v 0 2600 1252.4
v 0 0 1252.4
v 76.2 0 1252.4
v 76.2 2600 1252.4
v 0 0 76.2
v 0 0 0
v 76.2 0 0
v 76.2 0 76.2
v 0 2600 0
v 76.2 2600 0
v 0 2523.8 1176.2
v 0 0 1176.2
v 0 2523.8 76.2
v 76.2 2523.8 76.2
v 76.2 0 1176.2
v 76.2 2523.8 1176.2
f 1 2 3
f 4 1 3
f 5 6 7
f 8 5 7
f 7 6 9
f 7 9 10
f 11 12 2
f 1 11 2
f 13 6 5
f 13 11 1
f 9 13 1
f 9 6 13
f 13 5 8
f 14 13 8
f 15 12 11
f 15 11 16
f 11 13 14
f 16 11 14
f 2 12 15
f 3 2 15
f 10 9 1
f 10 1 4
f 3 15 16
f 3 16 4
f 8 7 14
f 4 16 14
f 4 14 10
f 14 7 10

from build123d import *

# Parameters (mm, degrees)
CROQUIS1_W                 = 76.2
CROQUIS1_H                 = 76.2
SALIENTE_EXTRUIR1_DEPTH    = 2600
SALIENTE_EXTRUIR1_2_DEPTH  = 2600
SALIENTE_EXTRUIR1_3_DEPTH  = 2600
SALIENTE_EXTRUIR1_4_DEPTH  = 2600
SALIENTE_EXTRUIR1_5_DEPTH  = 2600
SALIENTE_EXTRUIR1_6_DEPTH  = 2600
SALIENTE_EXTRUIR1_7_DEPTH  = 2600
SALIENTE_EXTRUIR1_8_DEPTH  = 2600
SALIENTE_EXTRUIR1_9_DEPTH  = 2600
SALIENTE_EXTRUIR1_10_DEPTH = 2600
CROQUIS2_W                 = 76.2
CROQUIS2_H                 = 76.2
SALIENTE_EXTRUIR2_DEPTH    = 1100
CROQUIS3_W                 = 1252.4
CROQUIS3_H                 = 2600
CORTAR_EXTRUIR1_DEPTH      = 5924.8


with BuildPart() as part:
    # Croquis1 → Saliente-Extruir1 (new body)
    with BuildSketch(Plane(origin=(0, 0, 0), x_dir=(1, 0, 0), z_dir=(0, 1, 0))):
        with Locations((38.1, -38.1)):
            Rectangle(CROQUIS1_W, CROQUIS1_H)
    extrude(amount=SALIENTE_EXTRUIR1_DEPTH)



with BuildPart() as body_2:
    # Croquis1 → Saliente-Extruir1 2 (new body)
    with BuildSketch(Plane(origin=(0, 0, 0), x_dir=(1, 0, 0), z_dir=(0, 1, 0))):
        with Locations((1519.3, -38.1)):
            Rectangle(CROQUIS1_W, CROQUIS1_H)
    extrude(amount=SALIENTE_EXTRUIR1_2_DEPTH)


with BuildPart() as body_3:
    # Croquis1 → Saliente-Extruir1 3 (new body)
    with BuildSketch(Plane(origin=(0, 0, 0), x_dir=(1, 0, 0), z_dir=(0, 1, 0))):
        with Locations((3000.5, -38.1)):
            Rectangle(CROQUIS1_W, CROQUIS1_H)
    extrude(amount=SALIENTE_EXTRUIR1_3_DEPTH)


with BuildPart() as body_4:
    # Croquis1 → Saliente-Extruir1 4 (new body)
    with BuildSketch(Plane(origin=(0, 0, 0), x_dir=(1, 0, 0), z_dir=(0, 1, 0))):
        with Locations((4481.7, -38.1)):
            Rectangle(CROQUIS1_W, CROQUIS1_H)
    extrude(amount=SALIENTE_EXTRUIR1_4_DEPTH)


with BuildPart() as body_5:
    # Croquis1 → Saliente-Extruir1 5 (new body)
    with BuildSketch(Plane(origin=(0, 0, 0), x_dir=(1, 0, 0), z_dir=(0, 1, 0))):
        with Locations((5962.9, -38.1)):
            Rectangle(CROQUIS1_W, CROQUIS1_H)
    extrude(amount=SALIENTE_EXTRUIR1_5_DEPTH)


with BuildPart() as body_6:
    # Croquis1 → Saliente-Extruir1 6 (new body)
    with BuildSketch(Plane(origin=(0, 0, 0), x_dir=(1, 0, 0), z_dir=(0, 1, 0))):
        with Locations((5962.9, -1214.3)):
            Rectangle(CROQUIS1_W, CROQUIS1_H)
    extrude(amount=SALIENTE_EXTRUIR1_6_DEPTH)


with BuildPart() as body_7:
    # Croquis1 → Saliente-Extruir1 7 (new body)
    with BuildSketch(Plane(origin=(0, 0, 0), x_dir=(1, 0, 0), z_dir=(0, 1, 0))):
        with Locations((4481.7, -1214.3)):
            Rectangle(CROQUIS1_W, CROQUIS1_H)
    extrude(amount=SALIENTE_EXTRUIR1_7_DEPTH)


with BuildPart() as body_8:
    # Croquis1 → Saliente-Extruir1 8 (new body)
    with BuildSketch(Plane(origin=(0, 0, 0), x_dir=(1, 0, 0), z_dir=(0, 1, 0))):
        with Locations((3000.5, -1214.3)):
            Rectangle(CROQUIS1_W, CROQUIS1_H)
    extrude(amount=SALIENTE_EXTRUIR1_8_DEPTH)


with BuildPart() as body_9:
    # Croquis1 → Saliente-Extruir1 9 (new body)
    with BuildSketch(Plane(origin=(0, 0, 0), x_dir=(1, 0, 0), z_dir=(0, 1, 0))):
        with Locations((1519.3, -1214.3)):
            Rectangle(CROQUIS1_W, CROQUIS1_H)
    extrude(amount=SALIENTE_EXTRUIR1_9_DEPTH)


with BuildPart() as body_10:
    # Croquis1 → Saliente-Extruir1 10 (new body)
    with BuildSketch(Plane(origin=(0, 0, 0), x_dir=(1, 0, 0), z_dir=(0, 1, 0))):
        with Locations((38.1, -1214.3)):
            Rectangle(CROQUIS1_W, CROQUIS1_H)
    extrude(amount=SALIENTE_EXTRUIR1_10_DEPTH)


with BuildPart() as part_1:
    add(part.part)

    add(body_2.part)  # Saliente-Extruir2 merges body 2

    add(body_3.part)  # Saliente-Extruir2 merges body 3

    add(body_4.part)  # Saliente-Extruir2 merges body 4

    add(body_5.part)  # Saliente-Extruir2 merges body 5

    add(body_6.part)  # Saliente-Extruir2 merges body 6

    add(body_7.part)  # Saliente-Extruir2 merges body 7

    add(body_8.part)  # Saliente-Extruir2 merges body 8

    add(body_9.part)  # Saliente-Extruir2 merges body 9

    add(body_10.part)  # Saliente-Extruir2 merges body 10
    # Croquis2 → Saliente-Extruir2 (add)
    with BuildSketch(Plane.XY.offset(76.2)):
        with Locations((38.1, 2561.9)):
            Rectangle(CROQUIS2_W, CROQUIS2_H)
        with Locations((1519.3, 2561.9)):
            Rectangle(CROQUIS2_W, CROQUIS2_H)
        with Locations((3000.5, 2561.9)):
            Rectangle(CROQUIS2_W, CROQUIS2_H)
        with Locations((4481.7, 2561.9)):
            Rectangle(CROQUIS2_W, CROQUIS2_H)
        with Locations((5962.9, 2561.9)):
            Rectangle(CROQUIS2_W, CROQUIS2_H)
    extrude(amount=SALIENTE_EXTRUIR2_DEPTH)

    # Croquis3 → Cortar-Extruir1 (cut)
    with BuildSketch(Plane(origin=(6001, 0, 0), x_dir=(0, 0, -1), z_dir=(1, 0, 0))):
        with Locations((-626.2, 1300)):
            Rectangle(CROQUIS3_W, CROQUIS3_H)
    extrude(amount=-CORTAR_EXTRUIR1_DEPTH, mode=Mode.SUBTRACT)


solid = part_1.part
